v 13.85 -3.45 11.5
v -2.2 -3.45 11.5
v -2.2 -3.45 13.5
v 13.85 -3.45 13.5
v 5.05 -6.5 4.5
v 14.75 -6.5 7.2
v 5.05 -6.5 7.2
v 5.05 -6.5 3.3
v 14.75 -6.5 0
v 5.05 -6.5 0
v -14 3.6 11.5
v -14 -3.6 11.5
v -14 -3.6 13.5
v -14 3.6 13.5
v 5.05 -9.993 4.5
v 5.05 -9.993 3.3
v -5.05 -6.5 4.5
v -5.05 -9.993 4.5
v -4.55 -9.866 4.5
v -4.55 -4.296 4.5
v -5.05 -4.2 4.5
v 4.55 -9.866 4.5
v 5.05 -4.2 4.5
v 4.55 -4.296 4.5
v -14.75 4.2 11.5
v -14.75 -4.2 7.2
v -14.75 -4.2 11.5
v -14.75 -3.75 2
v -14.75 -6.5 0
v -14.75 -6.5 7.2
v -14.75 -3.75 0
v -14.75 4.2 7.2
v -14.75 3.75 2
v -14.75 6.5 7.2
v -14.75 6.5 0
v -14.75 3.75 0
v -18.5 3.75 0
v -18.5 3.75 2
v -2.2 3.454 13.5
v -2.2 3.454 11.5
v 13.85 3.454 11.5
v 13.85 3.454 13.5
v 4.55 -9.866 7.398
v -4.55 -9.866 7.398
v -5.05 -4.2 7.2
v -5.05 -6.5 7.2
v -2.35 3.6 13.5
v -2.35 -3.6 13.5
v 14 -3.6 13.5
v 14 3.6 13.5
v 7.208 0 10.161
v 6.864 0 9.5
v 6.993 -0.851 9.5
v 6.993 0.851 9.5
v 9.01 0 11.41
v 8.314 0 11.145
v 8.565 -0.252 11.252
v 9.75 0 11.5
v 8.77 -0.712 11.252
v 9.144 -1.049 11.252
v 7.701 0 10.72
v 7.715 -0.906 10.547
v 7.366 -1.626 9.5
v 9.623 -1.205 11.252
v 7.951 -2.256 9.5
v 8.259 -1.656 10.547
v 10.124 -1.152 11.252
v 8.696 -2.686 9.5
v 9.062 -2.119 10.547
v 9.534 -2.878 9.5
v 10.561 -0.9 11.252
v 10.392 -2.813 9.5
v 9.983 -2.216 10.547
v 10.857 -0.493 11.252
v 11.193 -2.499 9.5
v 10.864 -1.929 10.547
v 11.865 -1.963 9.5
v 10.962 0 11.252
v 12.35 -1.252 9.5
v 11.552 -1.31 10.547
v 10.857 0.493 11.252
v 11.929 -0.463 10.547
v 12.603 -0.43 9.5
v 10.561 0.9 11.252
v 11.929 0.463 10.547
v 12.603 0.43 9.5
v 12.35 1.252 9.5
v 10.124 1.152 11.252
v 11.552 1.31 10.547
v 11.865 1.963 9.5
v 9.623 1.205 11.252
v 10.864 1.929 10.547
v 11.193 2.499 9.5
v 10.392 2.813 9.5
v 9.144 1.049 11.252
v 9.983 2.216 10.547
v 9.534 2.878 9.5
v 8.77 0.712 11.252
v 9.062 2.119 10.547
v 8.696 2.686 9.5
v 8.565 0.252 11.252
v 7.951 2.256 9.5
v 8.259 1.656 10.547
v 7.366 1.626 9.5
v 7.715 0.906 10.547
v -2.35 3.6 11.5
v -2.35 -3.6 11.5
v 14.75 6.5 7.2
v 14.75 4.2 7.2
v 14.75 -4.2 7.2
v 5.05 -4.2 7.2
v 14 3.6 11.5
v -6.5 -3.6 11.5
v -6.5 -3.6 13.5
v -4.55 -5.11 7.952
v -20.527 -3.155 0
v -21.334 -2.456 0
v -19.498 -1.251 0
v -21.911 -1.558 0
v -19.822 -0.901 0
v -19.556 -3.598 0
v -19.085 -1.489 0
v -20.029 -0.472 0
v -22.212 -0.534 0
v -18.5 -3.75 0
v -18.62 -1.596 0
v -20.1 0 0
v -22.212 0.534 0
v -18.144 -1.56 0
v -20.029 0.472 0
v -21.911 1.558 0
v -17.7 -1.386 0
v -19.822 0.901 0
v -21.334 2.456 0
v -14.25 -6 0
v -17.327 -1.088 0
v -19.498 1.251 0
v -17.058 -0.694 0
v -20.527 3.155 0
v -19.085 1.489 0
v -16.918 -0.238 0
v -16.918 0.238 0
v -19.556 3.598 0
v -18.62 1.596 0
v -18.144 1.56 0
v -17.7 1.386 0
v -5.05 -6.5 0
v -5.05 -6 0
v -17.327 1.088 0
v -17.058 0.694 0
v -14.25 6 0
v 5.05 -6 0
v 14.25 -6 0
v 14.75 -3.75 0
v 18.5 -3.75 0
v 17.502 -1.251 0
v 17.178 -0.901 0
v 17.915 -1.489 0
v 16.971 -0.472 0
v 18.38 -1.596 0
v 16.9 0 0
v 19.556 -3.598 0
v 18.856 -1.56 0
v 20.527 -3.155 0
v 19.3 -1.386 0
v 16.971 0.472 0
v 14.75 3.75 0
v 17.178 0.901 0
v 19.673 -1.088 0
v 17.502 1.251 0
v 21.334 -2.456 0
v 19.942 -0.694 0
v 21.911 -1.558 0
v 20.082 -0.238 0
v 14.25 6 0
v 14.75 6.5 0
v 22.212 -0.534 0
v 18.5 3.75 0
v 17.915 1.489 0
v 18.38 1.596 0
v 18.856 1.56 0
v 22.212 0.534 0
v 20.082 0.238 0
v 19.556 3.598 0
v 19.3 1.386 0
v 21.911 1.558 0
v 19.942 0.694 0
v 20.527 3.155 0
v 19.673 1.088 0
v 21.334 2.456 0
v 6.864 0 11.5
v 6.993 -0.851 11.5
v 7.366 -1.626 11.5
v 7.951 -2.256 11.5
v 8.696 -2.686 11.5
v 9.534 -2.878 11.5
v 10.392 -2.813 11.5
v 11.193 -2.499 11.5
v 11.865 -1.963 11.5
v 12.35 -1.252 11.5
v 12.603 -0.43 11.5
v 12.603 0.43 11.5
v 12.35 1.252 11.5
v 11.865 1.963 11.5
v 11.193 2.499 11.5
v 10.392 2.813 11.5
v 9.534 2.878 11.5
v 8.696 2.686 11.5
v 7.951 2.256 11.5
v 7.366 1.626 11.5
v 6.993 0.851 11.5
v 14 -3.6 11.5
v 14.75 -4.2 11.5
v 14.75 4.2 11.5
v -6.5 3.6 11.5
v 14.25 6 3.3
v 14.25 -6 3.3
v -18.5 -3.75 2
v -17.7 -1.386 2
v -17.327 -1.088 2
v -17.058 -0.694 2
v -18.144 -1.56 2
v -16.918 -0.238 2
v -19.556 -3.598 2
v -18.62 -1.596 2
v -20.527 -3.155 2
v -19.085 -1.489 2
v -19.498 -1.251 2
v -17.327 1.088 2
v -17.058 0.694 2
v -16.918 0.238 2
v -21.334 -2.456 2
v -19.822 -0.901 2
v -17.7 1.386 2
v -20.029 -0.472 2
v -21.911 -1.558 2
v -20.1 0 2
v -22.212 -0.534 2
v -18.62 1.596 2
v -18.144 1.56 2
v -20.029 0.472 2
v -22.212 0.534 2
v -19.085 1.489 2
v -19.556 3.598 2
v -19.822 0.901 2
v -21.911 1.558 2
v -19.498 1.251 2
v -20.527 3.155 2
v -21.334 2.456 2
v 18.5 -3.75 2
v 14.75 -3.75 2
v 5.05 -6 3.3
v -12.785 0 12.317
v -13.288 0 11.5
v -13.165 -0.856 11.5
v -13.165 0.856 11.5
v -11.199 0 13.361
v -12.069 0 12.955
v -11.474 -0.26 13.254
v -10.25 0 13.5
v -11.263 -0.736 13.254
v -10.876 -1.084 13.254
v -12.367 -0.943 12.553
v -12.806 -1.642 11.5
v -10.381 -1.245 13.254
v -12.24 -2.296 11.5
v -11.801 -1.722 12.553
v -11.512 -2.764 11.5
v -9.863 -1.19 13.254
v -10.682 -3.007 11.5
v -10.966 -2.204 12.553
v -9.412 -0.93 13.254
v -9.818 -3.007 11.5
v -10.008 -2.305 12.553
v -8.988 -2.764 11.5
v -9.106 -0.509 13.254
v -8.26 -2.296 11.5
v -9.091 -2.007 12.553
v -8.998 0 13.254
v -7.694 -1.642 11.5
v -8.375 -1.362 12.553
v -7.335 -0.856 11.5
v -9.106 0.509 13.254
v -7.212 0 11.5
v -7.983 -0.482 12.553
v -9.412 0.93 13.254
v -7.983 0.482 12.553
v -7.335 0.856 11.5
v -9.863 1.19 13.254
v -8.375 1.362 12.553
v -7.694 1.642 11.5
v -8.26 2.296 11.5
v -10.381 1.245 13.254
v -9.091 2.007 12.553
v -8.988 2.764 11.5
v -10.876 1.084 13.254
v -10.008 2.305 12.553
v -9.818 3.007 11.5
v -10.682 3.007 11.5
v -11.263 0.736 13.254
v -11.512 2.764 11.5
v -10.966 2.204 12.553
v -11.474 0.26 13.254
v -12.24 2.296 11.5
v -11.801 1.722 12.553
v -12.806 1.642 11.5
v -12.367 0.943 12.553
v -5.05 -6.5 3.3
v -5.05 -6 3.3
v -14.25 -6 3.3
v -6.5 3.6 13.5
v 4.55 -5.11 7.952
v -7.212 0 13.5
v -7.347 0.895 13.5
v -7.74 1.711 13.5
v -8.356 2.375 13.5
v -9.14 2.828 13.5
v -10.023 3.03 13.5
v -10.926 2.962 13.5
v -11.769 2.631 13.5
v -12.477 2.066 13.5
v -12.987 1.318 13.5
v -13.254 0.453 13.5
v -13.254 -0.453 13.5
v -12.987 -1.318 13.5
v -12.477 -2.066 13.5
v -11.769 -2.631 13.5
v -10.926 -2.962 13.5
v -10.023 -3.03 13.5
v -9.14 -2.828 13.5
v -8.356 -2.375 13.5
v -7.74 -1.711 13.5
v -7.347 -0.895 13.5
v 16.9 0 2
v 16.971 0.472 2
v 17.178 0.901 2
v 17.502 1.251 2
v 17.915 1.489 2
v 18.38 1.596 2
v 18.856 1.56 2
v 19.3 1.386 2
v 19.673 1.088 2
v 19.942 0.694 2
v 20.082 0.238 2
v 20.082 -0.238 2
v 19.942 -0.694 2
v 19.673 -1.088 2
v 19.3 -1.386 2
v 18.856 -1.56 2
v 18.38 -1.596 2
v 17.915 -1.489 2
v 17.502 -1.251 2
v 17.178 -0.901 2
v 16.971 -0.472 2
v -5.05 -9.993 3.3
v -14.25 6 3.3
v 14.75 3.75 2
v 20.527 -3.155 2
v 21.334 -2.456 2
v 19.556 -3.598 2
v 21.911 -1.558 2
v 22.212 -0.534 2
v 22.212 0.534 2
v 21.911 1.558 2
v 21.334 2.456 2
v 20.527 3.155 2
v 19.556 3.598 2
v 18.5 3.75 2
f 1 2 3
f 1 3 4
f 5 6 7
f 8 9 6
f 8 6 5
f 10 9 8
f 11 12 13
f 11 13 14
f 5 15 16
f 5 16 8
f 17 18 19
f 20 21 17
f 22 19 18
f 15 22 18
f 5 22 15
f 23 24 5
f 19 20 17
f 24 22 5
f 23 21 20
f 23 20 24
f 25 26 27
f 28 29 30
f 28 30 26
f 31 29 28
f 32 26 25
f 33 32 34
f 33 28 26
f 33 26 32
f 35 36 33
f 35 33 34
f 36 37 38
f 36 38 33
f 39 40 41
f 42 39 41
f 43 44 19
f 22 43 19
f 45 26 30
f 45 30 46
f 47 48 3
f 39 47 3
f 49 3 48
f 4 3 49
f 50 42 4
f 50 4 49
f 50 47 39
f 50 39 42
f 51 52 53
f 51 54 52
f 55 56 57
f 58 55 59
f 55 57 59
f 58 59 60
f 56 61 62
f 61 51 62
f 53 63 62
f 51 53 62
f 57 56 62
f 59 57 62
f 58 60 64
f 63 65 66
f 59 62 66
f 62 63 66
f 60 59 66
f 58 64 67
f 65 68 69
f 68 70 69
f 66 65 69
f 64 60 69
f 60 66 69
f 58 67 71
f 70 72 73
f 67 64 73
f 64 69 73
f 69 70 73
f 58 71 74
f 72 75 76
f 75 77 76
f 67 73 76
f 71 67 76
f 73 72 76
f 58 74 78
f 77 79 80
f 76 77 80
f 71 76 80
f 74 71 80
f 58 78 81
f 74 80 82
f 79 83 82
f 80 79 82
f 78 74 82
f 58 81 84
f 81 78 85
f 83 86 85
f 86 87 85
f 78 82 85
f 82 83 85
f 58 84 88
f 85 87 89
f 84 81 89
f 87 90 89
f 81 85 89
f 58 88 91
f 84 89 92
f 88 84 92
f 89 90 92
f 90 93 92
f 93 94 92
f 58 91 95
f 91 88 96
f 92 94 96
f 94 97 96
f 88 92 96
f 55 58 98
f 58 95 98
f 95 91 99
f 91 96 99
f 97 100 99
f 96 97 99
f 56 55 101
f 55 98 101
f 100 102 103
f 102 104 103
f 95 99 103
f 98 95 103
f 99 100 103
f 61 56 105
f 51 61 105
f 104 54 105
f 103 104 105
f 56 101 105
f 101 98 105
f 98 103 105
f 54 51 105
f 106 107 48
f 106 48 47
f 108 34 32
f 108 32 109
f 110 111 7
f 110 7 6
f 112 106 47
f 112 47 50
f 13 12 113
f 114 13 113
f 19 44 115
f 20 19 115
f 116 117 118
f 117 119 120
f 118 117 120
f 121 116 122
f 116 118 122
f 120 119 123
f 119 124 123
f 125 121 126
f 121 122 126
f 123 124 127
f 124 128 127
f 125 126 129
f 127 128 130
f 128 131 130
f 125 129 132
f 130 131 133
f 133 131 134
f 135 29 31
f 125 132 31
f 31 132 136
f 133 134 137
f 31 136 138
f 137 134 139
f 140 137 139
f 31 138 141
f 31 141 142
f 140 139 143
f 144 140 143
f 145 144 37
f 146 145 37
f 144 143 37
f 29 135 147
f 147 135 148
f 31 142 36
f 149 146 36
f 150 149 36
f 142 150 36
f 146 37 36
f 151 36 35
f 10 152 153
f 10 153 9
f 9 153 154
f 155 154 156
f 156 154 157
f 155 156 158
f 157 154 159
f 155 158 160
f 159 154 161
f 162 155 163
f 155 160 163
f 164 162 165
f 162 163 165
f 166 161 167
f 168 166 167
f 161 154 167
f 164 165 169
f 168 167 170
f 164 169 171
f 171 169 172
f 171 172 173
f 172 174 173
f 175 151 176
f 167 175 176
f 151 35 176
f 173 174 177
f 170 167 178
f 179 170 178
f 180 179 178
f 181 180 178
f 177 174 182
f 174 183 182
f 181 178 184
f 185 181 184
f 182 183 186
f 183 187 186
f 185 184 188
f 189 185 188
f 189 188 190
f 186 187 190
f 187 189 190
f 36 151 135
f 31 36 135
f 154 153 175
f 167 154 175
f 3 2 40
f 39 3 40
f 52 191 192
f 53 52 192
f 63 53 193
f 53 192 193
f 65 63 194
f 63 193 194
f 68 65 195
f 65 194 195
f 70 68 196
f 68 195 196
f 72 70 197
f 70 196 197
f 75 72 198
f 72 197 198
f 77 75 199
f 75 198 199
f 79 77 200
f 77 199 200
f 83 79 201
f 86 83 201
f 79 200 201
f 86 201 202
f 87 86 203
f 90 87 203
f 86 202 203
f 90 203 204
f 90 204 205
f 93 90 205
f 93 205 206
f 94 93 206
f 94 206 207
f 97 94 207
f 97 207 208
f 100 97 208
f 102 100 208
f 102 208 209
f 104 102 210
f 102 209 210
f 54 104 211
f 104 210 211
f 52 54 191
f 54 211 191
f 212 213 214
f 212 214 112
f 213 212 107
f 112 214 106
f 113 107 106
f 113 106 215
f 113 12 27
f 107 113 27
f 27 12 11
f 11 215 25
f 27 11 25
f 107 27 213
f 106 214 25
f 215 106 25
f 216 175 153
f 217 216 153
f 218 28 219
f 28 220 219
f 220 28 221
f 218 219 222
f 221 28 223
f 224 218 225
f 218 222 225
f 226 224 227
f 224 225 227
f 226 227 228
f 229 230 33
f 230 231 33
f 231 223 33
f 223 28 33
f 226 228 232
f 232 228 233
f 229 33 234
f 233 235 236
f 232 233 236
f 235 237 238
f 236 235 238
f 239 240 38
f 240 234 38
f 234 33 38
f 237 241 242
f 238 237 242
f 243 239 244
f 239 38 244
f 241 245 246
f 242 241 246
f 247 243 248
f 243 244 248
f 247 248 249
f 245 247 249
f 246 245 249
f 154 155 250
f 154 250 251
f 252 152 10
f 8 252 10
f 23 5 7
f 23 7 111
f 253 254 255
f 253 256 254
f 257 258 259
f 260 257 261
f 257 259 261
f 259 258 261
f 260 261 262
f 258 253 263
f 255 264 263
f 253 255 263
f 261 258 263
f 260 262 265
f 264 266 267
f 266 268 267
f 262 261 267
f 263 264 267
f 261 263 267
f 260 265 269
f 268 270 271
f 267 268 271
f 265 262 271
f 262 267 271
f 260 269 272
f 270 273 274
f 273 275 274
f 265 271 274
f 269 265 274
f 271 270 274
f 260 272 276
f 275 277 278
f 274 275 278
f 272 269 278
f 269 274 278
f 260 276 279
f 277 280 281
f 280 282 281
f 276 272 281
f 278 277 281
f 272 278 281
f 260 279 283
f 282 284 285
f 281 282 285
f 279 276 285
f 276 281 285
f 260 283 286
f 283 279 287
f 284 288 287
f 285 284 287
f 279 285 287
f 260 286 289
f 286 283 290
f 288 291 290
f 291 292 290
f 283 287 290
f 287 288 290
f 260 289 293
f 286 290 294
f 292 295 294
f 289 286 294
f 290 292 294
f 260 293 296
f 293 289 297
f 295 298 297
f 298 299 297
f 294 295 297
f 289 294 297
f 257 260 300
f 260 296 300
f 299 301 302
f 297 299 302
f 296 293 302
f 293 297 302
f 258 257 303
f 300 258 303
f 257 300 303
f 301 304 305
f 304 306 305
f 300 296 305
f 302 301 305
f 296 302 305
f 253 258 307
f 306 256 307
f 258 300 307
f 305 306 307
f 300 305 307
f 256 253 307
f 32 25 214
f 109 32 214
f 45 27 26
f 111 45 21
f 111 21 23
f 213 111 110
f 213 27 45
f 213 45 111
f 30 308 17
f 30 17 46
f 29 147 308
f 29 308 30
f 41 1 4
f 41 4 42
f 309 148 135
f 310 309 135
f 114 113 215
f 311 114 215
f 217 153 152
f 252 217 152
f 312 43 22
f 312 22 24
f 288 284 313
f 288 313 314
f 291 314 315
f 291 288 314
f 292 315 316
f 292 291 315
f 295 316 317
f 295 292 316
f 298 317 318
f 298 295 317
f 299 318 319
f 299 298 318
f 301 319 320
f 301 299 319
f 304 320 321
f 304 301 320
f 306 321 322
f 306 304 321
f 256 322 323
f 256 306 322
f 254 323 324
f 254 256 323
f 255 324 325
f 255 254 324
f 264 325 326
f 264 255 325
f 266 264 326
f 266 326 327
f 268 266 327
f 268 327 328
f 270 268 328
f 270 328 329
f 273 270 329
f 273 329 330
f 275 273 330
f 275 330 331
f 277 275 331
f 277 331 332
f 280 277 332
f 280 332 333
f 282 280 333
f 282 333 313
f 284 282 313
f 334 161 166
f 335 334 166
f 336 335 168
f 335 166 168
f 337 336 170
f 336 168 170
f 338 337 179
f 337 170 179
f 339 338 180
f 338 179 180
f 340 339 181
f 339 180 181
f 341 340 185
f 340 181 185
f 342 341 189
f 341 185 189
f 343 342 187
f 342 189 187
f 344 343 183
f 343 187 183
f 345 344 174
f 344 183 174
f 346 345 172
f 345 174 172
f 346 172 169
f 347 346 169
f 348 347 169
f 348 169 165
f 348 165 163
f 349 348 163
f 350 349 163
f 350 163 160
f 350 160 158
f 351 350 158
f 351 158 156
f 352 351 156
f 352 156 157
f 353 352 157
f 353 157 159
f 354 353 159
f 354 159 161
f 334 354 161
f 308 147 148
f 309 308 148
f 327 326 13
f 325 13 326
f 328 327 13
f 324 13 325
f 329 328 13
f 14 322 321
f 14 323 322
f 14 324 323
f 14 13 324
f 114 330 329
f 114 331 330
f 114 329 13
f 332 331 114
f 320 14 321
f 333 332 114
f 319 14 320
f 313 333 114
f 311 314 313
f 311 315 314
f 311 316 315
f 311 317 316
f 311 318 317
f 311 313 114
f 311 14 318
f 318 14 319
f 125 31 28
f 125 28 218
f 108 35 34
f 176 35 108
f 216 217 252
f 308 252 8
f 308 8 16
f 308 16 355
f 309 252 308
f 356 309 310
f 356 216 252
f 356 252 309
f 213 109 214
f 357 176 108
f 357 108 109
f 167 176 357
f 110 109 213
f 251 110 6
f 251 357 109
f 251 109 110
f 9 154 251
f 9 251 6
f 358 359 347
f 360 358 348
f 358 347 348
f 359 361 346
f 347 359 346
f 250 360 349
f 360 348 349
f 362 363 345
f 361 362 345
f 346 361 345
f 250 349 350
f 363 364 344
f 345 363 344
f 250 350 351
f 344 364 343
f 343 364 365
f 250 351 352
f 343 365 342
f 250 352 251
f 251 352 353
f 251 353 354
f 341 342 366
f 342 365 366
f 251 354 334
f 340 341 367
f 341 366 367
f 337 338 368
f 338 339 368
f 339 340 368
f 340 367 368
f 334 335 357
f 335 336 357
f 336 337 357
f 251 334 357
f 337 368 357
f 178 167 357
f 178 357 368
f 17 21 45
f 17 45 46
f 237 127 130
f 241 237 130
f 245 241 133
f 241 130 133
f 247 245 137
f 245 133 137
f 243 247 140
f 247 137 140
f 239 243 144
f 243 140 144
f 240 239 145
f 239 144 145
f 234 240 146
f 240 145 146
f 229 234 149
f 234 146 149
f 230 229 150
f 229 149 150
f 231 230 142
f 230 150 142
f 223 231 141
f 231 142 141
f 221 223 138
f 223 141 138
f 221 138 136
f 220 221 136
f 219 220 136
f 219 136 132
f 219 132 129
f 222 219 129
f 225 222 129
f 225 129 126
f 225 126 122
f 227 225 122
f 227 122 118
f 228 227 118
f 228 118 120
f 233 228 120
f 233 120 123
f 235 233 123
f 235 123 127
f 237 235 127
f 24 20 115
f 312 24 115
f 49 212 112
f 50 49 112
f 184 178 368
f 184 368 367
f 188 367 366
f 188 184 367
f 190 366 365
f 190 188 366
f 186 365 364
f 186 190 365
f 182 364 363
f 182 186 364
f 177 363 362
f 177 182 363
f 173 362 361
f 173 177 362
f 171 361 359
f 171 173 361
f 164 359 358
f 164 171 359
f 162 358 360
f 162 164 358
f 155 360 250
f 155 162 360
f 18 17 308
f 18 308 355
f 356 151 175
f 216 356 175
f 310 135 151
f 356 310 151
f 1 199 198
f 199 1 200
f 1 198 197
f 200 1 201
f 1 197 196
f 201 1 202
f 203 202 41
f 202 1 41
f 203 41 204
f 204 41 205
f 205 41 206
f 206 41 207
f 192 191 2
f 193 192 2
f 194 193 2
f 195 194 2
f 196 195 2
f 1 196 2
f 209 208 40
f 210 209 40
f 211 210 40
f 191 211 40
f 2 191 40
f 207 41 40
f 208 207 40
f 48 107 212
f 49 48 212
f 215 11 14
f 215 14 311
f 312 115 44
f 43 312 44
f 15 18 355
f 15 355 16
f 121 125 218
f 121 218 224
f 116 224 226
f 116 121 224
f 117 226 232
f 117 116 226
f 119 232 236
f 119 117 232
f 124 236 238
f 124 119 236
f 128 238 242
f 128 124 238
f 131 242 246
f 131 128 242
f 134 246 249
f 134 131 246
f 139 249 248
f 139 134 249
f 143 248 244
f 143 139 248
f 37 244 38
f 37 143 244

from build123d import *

# Parameters (mm, degrees)
ESTRUSIONE_ESTRUSIONE1_DEPTH = 4.5
NERVATURA1_START             = -4.55
NERVATURA1_DEPTH             = 9.1
ESTRUSIONE_ESTRUSIONE2_DEPTH = 7
TAGLIO_ESTRUSIONE1_DEPTH     = 3.3
ESTRUSIONE_ESTRUSIONE3_DEPTH = 2
FORO1_D                      = 3.2
FORO2_D                      = 3.2
SCHIZZO10_W                  = 29.5
SCHIZZO10_H                  = 2.3
SCHIZZO10_W_2                = 9.7
TAGLIO_ESTRUSIONE2_DEPTH     = 4.3
SCHIZZO11_W                  = 16.35
SCHIZZO11_H                  = 7.2
SCHIZZO11_W_2                = 16.05
SCHIZZO11_H_2                = 6.904461538
ESTRUSIONE_ESTRUSIONE4_DEPTH = 2
SCHIZZO12_R                  = 2.885572668
TAGLIO_ESTRUSIONE3_DEPTH     = 2
SCHIZZO15_W                  = 7.5
SCHIZZO15_H                  = 7.2
SCHIZZO15_R                  = 3.038054308
ESTRUSIONE_ESTRUSIONE5_DEPTH = 2


# Read off the part's stored shape, not the designer's step: Nervatura1
with BuildPart() as part:
    # Schizzo1 → Estrusione-Estrusione1 (new body)
    with BuildSketch(Plane.XY.offset(4.5)):
        Polygon((5.05, -9.992575631), (5.05, -6.5), (14.75, -6.5), (14.75, 6.5), (-14.75, 6.5), (-14.75, -6.5), (-5.05, -6.5), (-5.05, -9.992575631), align=None)
    extrude(amount=-ESTRUSIONE_ESTRUSIONE1_DEPTH)

    # Nervatura1 outline → Nervatura1 (add)
    with BuildSketch(Plane.YZ.offset(NERVATURA1_START)):
        Polygon((-4.296088186, 4.5), (-5.110000145, 7.951589572), (-9.866118458, 7.398410428), (-9.866118458, 4.5), align=None)
    extrude(amount=NERVATURA1_DEPTH)

    # Schizzo3 → Estrusione-Estrusione2 (add)
    with BuildSketch(Plane.XY.offset(4.5)):
        Polygon((-14.75, -6.5), (-14.75, 6.5), (14.75, 6.5), (14.75, -6.5), (5.05, -6.5), (5.05, -4.2), (-5.05, -4.2), (-5.05, -6.5), align=None)
    extrude(amount=ESTRUSIONE_ESTRUSIONE2_DEPTH)

    # Schizzo4 → Taglio-Estrusione1 (cut)
    with BuildSketch(Plane(origin=(0, 0, 0), x_dir=(-1, 0, 0), z_dir=(0, 0, -1))):
        Polygon((5.05, -9.992575631), (5.05, -6.5), (5.05, -6), (14.25, -6), (14.25, 6), (-14.25, 6), (-14.25, -6), (-5.05, -6), (-5.05, -6.5), (-5.05, -9.992575631), align=None)
    extrude(amount=-TAGLIO_ESTRUSIONE1_DEPTH, mode=Mode.SUBTRACT)

    # Schizzo5 → Estrusione-Estrusione3 (add)
    with BuildSketch(Plane(origin=(0, 0, 0), x_dir=(-1, 0, 0), z_dir=(0, 0, -1))):
        with BuildLine():
            Line((14.75, 3.75), (14.75, -3.75))
            Line((14.75, -3.75), (18.5, -3.75))
            ThreePointArc((18.5, -3.75), (22.25, 0), (18.5, 3.75))
            Line((18.5, 3.75), (14.75, 3.75))
        make_face()
        with BuildLine():
            Line((-14.75, -3.75), (-14.75, 3.75))
            Line((-14.75, 3.75), (-18.5, 3.75))
            ThreePointArc((-18.5, 3.75), (-22.25, 0), (-18.5, -3.75))
            Line((-18.5, -3.75), (-14.75, -3.75))
        make_face()
    extrude(amount=-ESTRUSIONE_ESTRUSIONE3_DEPTH)

    # Foro1 (through all)
    with Locations(Plane.XY.offset(2)):
        with Locations((18.5, 0)):
            Hole(FORO1_D / 2)

    # Foro2 (through all)
    with Locations(Plane.XY.offset(2)):
        with Locations((-18.5, 0)):
            Hole(FORO2_D / 2)

    # Schizzo10 → Taglio-Estrusione2 (cut)
    with BuildSketch(Plane.XY.offset(11.5)):
        with Locations((0, 5.35)):
            Rectangle(SCHIZZO10_W, SCHIZZO10_H)
        with Locations((9.9, -5.35)):
            Rectangle(SCHIZZO10_W_2, SCHIZZO10_H)
        with Locations((-9.9, -5.35)):
            Rectangle(SCHIZZO10_W_2, SCHIZZO10_H)
    extrude(amount=-TAGLIO_ESTRUSIONE2_DEPTH, mode=Mode.SUBTRACT)

    # Schizzo11 → Estrusione-Estrusione4 (add)
    with BuildSketch(Plane.XY.offset(11.5)):
        with Locations((5.825, 0)):
            Rectangle(SCHIZZO11_W, SCHIZZO11_H)
        with Locations((5.825, 0.002230769)):
            Rectangle(SCHIZZO11_W_2, SCHIZZO11_H_2, mode=Mode.SUBTRACT)
    extrude(amount=ESTRUSIONE_ESTRUSIONE4_DEPTH)

    # Schizzo12 → Taglio-Estrusione3 (cut)
    with BuildSketch(Plane.XY.offset(11.5)):
        with Locations(Location((9.75, 0, 0), (0, 0, 180))):
            Circle(SCHIZZO12_R)
    extrude(amount=-TAGLIO_ESTRUSIONE3_DEPTH, mode=Mode.SUBTRACT)

    # Schizzo13 → Rivoluzione1 (revolve)
    with BuildSketch(Plane(origin=(0, 0, 0), x_dir=(1, 0, 0), z_dir=(0, 1, 0)), mode=Mode.PRIVATE) as rivoluzione1_sk:
        with BuildLine():
            Line((12.635572668, -9.5), (9.75, -9.5))
            Line((9.75, -9.5), (9.75, -11.5))
            ThreePointArc((9.75, -11.5), (11.505457891, -10.951118249), (12.635572668, -9.5))
        make_face()
    revolve(rivoluzione1_sk.sketch.rotate(Axis((9.75, 0, 9.5), (0, 0, 1)), 180), axis=Axis((9.75, 0, 9.5), (0, 0, 1)))

    # Schizzo14 → Rivoluzione2 (revolve)
    with BuildSketch(Plane(origin=(0, 0, 0), x_dir=(1, 0, 0), z_dir=(0, 1, 0)), mode=Mode.PRIVATE) as rivoluzione2_sk:
        with BuildLine():
            Line((-7.211945692, -11.5), (-10.25, -11.5))
            Line((-10.25, -11.5), (-10.25, -13.5))
            ThreePointArc((-10.25, -13.5), (-8.431362187, -12.955116727), (-7.211945692, -11.5))
        make_face()
    revolve(rivoluzione2_sk.sketch.rotate(Axis((-10.25, 0, 11.5), (0, 0, 1)), 180), axis=Axis((-10.25, 0, 11.5), (0, 0, 1)))

    # Schizzo15 → Estrusione-Estrusione5 (add)
    with BuildSketch(Plane.XY.offset(11.5)):
        with Locations((-10.25, 0)):
            Rectangle(SCHIZZO15_W, SCHIZZO15_H)
        with Locations((-10.25, 0)):
            Circle(SCHIZZO15_R, mode=Mode.SUBTRACT)
    extrude(amount=ESTRUSIONE_ESTRUSIONE5_DEPTH)


solid = part.part
